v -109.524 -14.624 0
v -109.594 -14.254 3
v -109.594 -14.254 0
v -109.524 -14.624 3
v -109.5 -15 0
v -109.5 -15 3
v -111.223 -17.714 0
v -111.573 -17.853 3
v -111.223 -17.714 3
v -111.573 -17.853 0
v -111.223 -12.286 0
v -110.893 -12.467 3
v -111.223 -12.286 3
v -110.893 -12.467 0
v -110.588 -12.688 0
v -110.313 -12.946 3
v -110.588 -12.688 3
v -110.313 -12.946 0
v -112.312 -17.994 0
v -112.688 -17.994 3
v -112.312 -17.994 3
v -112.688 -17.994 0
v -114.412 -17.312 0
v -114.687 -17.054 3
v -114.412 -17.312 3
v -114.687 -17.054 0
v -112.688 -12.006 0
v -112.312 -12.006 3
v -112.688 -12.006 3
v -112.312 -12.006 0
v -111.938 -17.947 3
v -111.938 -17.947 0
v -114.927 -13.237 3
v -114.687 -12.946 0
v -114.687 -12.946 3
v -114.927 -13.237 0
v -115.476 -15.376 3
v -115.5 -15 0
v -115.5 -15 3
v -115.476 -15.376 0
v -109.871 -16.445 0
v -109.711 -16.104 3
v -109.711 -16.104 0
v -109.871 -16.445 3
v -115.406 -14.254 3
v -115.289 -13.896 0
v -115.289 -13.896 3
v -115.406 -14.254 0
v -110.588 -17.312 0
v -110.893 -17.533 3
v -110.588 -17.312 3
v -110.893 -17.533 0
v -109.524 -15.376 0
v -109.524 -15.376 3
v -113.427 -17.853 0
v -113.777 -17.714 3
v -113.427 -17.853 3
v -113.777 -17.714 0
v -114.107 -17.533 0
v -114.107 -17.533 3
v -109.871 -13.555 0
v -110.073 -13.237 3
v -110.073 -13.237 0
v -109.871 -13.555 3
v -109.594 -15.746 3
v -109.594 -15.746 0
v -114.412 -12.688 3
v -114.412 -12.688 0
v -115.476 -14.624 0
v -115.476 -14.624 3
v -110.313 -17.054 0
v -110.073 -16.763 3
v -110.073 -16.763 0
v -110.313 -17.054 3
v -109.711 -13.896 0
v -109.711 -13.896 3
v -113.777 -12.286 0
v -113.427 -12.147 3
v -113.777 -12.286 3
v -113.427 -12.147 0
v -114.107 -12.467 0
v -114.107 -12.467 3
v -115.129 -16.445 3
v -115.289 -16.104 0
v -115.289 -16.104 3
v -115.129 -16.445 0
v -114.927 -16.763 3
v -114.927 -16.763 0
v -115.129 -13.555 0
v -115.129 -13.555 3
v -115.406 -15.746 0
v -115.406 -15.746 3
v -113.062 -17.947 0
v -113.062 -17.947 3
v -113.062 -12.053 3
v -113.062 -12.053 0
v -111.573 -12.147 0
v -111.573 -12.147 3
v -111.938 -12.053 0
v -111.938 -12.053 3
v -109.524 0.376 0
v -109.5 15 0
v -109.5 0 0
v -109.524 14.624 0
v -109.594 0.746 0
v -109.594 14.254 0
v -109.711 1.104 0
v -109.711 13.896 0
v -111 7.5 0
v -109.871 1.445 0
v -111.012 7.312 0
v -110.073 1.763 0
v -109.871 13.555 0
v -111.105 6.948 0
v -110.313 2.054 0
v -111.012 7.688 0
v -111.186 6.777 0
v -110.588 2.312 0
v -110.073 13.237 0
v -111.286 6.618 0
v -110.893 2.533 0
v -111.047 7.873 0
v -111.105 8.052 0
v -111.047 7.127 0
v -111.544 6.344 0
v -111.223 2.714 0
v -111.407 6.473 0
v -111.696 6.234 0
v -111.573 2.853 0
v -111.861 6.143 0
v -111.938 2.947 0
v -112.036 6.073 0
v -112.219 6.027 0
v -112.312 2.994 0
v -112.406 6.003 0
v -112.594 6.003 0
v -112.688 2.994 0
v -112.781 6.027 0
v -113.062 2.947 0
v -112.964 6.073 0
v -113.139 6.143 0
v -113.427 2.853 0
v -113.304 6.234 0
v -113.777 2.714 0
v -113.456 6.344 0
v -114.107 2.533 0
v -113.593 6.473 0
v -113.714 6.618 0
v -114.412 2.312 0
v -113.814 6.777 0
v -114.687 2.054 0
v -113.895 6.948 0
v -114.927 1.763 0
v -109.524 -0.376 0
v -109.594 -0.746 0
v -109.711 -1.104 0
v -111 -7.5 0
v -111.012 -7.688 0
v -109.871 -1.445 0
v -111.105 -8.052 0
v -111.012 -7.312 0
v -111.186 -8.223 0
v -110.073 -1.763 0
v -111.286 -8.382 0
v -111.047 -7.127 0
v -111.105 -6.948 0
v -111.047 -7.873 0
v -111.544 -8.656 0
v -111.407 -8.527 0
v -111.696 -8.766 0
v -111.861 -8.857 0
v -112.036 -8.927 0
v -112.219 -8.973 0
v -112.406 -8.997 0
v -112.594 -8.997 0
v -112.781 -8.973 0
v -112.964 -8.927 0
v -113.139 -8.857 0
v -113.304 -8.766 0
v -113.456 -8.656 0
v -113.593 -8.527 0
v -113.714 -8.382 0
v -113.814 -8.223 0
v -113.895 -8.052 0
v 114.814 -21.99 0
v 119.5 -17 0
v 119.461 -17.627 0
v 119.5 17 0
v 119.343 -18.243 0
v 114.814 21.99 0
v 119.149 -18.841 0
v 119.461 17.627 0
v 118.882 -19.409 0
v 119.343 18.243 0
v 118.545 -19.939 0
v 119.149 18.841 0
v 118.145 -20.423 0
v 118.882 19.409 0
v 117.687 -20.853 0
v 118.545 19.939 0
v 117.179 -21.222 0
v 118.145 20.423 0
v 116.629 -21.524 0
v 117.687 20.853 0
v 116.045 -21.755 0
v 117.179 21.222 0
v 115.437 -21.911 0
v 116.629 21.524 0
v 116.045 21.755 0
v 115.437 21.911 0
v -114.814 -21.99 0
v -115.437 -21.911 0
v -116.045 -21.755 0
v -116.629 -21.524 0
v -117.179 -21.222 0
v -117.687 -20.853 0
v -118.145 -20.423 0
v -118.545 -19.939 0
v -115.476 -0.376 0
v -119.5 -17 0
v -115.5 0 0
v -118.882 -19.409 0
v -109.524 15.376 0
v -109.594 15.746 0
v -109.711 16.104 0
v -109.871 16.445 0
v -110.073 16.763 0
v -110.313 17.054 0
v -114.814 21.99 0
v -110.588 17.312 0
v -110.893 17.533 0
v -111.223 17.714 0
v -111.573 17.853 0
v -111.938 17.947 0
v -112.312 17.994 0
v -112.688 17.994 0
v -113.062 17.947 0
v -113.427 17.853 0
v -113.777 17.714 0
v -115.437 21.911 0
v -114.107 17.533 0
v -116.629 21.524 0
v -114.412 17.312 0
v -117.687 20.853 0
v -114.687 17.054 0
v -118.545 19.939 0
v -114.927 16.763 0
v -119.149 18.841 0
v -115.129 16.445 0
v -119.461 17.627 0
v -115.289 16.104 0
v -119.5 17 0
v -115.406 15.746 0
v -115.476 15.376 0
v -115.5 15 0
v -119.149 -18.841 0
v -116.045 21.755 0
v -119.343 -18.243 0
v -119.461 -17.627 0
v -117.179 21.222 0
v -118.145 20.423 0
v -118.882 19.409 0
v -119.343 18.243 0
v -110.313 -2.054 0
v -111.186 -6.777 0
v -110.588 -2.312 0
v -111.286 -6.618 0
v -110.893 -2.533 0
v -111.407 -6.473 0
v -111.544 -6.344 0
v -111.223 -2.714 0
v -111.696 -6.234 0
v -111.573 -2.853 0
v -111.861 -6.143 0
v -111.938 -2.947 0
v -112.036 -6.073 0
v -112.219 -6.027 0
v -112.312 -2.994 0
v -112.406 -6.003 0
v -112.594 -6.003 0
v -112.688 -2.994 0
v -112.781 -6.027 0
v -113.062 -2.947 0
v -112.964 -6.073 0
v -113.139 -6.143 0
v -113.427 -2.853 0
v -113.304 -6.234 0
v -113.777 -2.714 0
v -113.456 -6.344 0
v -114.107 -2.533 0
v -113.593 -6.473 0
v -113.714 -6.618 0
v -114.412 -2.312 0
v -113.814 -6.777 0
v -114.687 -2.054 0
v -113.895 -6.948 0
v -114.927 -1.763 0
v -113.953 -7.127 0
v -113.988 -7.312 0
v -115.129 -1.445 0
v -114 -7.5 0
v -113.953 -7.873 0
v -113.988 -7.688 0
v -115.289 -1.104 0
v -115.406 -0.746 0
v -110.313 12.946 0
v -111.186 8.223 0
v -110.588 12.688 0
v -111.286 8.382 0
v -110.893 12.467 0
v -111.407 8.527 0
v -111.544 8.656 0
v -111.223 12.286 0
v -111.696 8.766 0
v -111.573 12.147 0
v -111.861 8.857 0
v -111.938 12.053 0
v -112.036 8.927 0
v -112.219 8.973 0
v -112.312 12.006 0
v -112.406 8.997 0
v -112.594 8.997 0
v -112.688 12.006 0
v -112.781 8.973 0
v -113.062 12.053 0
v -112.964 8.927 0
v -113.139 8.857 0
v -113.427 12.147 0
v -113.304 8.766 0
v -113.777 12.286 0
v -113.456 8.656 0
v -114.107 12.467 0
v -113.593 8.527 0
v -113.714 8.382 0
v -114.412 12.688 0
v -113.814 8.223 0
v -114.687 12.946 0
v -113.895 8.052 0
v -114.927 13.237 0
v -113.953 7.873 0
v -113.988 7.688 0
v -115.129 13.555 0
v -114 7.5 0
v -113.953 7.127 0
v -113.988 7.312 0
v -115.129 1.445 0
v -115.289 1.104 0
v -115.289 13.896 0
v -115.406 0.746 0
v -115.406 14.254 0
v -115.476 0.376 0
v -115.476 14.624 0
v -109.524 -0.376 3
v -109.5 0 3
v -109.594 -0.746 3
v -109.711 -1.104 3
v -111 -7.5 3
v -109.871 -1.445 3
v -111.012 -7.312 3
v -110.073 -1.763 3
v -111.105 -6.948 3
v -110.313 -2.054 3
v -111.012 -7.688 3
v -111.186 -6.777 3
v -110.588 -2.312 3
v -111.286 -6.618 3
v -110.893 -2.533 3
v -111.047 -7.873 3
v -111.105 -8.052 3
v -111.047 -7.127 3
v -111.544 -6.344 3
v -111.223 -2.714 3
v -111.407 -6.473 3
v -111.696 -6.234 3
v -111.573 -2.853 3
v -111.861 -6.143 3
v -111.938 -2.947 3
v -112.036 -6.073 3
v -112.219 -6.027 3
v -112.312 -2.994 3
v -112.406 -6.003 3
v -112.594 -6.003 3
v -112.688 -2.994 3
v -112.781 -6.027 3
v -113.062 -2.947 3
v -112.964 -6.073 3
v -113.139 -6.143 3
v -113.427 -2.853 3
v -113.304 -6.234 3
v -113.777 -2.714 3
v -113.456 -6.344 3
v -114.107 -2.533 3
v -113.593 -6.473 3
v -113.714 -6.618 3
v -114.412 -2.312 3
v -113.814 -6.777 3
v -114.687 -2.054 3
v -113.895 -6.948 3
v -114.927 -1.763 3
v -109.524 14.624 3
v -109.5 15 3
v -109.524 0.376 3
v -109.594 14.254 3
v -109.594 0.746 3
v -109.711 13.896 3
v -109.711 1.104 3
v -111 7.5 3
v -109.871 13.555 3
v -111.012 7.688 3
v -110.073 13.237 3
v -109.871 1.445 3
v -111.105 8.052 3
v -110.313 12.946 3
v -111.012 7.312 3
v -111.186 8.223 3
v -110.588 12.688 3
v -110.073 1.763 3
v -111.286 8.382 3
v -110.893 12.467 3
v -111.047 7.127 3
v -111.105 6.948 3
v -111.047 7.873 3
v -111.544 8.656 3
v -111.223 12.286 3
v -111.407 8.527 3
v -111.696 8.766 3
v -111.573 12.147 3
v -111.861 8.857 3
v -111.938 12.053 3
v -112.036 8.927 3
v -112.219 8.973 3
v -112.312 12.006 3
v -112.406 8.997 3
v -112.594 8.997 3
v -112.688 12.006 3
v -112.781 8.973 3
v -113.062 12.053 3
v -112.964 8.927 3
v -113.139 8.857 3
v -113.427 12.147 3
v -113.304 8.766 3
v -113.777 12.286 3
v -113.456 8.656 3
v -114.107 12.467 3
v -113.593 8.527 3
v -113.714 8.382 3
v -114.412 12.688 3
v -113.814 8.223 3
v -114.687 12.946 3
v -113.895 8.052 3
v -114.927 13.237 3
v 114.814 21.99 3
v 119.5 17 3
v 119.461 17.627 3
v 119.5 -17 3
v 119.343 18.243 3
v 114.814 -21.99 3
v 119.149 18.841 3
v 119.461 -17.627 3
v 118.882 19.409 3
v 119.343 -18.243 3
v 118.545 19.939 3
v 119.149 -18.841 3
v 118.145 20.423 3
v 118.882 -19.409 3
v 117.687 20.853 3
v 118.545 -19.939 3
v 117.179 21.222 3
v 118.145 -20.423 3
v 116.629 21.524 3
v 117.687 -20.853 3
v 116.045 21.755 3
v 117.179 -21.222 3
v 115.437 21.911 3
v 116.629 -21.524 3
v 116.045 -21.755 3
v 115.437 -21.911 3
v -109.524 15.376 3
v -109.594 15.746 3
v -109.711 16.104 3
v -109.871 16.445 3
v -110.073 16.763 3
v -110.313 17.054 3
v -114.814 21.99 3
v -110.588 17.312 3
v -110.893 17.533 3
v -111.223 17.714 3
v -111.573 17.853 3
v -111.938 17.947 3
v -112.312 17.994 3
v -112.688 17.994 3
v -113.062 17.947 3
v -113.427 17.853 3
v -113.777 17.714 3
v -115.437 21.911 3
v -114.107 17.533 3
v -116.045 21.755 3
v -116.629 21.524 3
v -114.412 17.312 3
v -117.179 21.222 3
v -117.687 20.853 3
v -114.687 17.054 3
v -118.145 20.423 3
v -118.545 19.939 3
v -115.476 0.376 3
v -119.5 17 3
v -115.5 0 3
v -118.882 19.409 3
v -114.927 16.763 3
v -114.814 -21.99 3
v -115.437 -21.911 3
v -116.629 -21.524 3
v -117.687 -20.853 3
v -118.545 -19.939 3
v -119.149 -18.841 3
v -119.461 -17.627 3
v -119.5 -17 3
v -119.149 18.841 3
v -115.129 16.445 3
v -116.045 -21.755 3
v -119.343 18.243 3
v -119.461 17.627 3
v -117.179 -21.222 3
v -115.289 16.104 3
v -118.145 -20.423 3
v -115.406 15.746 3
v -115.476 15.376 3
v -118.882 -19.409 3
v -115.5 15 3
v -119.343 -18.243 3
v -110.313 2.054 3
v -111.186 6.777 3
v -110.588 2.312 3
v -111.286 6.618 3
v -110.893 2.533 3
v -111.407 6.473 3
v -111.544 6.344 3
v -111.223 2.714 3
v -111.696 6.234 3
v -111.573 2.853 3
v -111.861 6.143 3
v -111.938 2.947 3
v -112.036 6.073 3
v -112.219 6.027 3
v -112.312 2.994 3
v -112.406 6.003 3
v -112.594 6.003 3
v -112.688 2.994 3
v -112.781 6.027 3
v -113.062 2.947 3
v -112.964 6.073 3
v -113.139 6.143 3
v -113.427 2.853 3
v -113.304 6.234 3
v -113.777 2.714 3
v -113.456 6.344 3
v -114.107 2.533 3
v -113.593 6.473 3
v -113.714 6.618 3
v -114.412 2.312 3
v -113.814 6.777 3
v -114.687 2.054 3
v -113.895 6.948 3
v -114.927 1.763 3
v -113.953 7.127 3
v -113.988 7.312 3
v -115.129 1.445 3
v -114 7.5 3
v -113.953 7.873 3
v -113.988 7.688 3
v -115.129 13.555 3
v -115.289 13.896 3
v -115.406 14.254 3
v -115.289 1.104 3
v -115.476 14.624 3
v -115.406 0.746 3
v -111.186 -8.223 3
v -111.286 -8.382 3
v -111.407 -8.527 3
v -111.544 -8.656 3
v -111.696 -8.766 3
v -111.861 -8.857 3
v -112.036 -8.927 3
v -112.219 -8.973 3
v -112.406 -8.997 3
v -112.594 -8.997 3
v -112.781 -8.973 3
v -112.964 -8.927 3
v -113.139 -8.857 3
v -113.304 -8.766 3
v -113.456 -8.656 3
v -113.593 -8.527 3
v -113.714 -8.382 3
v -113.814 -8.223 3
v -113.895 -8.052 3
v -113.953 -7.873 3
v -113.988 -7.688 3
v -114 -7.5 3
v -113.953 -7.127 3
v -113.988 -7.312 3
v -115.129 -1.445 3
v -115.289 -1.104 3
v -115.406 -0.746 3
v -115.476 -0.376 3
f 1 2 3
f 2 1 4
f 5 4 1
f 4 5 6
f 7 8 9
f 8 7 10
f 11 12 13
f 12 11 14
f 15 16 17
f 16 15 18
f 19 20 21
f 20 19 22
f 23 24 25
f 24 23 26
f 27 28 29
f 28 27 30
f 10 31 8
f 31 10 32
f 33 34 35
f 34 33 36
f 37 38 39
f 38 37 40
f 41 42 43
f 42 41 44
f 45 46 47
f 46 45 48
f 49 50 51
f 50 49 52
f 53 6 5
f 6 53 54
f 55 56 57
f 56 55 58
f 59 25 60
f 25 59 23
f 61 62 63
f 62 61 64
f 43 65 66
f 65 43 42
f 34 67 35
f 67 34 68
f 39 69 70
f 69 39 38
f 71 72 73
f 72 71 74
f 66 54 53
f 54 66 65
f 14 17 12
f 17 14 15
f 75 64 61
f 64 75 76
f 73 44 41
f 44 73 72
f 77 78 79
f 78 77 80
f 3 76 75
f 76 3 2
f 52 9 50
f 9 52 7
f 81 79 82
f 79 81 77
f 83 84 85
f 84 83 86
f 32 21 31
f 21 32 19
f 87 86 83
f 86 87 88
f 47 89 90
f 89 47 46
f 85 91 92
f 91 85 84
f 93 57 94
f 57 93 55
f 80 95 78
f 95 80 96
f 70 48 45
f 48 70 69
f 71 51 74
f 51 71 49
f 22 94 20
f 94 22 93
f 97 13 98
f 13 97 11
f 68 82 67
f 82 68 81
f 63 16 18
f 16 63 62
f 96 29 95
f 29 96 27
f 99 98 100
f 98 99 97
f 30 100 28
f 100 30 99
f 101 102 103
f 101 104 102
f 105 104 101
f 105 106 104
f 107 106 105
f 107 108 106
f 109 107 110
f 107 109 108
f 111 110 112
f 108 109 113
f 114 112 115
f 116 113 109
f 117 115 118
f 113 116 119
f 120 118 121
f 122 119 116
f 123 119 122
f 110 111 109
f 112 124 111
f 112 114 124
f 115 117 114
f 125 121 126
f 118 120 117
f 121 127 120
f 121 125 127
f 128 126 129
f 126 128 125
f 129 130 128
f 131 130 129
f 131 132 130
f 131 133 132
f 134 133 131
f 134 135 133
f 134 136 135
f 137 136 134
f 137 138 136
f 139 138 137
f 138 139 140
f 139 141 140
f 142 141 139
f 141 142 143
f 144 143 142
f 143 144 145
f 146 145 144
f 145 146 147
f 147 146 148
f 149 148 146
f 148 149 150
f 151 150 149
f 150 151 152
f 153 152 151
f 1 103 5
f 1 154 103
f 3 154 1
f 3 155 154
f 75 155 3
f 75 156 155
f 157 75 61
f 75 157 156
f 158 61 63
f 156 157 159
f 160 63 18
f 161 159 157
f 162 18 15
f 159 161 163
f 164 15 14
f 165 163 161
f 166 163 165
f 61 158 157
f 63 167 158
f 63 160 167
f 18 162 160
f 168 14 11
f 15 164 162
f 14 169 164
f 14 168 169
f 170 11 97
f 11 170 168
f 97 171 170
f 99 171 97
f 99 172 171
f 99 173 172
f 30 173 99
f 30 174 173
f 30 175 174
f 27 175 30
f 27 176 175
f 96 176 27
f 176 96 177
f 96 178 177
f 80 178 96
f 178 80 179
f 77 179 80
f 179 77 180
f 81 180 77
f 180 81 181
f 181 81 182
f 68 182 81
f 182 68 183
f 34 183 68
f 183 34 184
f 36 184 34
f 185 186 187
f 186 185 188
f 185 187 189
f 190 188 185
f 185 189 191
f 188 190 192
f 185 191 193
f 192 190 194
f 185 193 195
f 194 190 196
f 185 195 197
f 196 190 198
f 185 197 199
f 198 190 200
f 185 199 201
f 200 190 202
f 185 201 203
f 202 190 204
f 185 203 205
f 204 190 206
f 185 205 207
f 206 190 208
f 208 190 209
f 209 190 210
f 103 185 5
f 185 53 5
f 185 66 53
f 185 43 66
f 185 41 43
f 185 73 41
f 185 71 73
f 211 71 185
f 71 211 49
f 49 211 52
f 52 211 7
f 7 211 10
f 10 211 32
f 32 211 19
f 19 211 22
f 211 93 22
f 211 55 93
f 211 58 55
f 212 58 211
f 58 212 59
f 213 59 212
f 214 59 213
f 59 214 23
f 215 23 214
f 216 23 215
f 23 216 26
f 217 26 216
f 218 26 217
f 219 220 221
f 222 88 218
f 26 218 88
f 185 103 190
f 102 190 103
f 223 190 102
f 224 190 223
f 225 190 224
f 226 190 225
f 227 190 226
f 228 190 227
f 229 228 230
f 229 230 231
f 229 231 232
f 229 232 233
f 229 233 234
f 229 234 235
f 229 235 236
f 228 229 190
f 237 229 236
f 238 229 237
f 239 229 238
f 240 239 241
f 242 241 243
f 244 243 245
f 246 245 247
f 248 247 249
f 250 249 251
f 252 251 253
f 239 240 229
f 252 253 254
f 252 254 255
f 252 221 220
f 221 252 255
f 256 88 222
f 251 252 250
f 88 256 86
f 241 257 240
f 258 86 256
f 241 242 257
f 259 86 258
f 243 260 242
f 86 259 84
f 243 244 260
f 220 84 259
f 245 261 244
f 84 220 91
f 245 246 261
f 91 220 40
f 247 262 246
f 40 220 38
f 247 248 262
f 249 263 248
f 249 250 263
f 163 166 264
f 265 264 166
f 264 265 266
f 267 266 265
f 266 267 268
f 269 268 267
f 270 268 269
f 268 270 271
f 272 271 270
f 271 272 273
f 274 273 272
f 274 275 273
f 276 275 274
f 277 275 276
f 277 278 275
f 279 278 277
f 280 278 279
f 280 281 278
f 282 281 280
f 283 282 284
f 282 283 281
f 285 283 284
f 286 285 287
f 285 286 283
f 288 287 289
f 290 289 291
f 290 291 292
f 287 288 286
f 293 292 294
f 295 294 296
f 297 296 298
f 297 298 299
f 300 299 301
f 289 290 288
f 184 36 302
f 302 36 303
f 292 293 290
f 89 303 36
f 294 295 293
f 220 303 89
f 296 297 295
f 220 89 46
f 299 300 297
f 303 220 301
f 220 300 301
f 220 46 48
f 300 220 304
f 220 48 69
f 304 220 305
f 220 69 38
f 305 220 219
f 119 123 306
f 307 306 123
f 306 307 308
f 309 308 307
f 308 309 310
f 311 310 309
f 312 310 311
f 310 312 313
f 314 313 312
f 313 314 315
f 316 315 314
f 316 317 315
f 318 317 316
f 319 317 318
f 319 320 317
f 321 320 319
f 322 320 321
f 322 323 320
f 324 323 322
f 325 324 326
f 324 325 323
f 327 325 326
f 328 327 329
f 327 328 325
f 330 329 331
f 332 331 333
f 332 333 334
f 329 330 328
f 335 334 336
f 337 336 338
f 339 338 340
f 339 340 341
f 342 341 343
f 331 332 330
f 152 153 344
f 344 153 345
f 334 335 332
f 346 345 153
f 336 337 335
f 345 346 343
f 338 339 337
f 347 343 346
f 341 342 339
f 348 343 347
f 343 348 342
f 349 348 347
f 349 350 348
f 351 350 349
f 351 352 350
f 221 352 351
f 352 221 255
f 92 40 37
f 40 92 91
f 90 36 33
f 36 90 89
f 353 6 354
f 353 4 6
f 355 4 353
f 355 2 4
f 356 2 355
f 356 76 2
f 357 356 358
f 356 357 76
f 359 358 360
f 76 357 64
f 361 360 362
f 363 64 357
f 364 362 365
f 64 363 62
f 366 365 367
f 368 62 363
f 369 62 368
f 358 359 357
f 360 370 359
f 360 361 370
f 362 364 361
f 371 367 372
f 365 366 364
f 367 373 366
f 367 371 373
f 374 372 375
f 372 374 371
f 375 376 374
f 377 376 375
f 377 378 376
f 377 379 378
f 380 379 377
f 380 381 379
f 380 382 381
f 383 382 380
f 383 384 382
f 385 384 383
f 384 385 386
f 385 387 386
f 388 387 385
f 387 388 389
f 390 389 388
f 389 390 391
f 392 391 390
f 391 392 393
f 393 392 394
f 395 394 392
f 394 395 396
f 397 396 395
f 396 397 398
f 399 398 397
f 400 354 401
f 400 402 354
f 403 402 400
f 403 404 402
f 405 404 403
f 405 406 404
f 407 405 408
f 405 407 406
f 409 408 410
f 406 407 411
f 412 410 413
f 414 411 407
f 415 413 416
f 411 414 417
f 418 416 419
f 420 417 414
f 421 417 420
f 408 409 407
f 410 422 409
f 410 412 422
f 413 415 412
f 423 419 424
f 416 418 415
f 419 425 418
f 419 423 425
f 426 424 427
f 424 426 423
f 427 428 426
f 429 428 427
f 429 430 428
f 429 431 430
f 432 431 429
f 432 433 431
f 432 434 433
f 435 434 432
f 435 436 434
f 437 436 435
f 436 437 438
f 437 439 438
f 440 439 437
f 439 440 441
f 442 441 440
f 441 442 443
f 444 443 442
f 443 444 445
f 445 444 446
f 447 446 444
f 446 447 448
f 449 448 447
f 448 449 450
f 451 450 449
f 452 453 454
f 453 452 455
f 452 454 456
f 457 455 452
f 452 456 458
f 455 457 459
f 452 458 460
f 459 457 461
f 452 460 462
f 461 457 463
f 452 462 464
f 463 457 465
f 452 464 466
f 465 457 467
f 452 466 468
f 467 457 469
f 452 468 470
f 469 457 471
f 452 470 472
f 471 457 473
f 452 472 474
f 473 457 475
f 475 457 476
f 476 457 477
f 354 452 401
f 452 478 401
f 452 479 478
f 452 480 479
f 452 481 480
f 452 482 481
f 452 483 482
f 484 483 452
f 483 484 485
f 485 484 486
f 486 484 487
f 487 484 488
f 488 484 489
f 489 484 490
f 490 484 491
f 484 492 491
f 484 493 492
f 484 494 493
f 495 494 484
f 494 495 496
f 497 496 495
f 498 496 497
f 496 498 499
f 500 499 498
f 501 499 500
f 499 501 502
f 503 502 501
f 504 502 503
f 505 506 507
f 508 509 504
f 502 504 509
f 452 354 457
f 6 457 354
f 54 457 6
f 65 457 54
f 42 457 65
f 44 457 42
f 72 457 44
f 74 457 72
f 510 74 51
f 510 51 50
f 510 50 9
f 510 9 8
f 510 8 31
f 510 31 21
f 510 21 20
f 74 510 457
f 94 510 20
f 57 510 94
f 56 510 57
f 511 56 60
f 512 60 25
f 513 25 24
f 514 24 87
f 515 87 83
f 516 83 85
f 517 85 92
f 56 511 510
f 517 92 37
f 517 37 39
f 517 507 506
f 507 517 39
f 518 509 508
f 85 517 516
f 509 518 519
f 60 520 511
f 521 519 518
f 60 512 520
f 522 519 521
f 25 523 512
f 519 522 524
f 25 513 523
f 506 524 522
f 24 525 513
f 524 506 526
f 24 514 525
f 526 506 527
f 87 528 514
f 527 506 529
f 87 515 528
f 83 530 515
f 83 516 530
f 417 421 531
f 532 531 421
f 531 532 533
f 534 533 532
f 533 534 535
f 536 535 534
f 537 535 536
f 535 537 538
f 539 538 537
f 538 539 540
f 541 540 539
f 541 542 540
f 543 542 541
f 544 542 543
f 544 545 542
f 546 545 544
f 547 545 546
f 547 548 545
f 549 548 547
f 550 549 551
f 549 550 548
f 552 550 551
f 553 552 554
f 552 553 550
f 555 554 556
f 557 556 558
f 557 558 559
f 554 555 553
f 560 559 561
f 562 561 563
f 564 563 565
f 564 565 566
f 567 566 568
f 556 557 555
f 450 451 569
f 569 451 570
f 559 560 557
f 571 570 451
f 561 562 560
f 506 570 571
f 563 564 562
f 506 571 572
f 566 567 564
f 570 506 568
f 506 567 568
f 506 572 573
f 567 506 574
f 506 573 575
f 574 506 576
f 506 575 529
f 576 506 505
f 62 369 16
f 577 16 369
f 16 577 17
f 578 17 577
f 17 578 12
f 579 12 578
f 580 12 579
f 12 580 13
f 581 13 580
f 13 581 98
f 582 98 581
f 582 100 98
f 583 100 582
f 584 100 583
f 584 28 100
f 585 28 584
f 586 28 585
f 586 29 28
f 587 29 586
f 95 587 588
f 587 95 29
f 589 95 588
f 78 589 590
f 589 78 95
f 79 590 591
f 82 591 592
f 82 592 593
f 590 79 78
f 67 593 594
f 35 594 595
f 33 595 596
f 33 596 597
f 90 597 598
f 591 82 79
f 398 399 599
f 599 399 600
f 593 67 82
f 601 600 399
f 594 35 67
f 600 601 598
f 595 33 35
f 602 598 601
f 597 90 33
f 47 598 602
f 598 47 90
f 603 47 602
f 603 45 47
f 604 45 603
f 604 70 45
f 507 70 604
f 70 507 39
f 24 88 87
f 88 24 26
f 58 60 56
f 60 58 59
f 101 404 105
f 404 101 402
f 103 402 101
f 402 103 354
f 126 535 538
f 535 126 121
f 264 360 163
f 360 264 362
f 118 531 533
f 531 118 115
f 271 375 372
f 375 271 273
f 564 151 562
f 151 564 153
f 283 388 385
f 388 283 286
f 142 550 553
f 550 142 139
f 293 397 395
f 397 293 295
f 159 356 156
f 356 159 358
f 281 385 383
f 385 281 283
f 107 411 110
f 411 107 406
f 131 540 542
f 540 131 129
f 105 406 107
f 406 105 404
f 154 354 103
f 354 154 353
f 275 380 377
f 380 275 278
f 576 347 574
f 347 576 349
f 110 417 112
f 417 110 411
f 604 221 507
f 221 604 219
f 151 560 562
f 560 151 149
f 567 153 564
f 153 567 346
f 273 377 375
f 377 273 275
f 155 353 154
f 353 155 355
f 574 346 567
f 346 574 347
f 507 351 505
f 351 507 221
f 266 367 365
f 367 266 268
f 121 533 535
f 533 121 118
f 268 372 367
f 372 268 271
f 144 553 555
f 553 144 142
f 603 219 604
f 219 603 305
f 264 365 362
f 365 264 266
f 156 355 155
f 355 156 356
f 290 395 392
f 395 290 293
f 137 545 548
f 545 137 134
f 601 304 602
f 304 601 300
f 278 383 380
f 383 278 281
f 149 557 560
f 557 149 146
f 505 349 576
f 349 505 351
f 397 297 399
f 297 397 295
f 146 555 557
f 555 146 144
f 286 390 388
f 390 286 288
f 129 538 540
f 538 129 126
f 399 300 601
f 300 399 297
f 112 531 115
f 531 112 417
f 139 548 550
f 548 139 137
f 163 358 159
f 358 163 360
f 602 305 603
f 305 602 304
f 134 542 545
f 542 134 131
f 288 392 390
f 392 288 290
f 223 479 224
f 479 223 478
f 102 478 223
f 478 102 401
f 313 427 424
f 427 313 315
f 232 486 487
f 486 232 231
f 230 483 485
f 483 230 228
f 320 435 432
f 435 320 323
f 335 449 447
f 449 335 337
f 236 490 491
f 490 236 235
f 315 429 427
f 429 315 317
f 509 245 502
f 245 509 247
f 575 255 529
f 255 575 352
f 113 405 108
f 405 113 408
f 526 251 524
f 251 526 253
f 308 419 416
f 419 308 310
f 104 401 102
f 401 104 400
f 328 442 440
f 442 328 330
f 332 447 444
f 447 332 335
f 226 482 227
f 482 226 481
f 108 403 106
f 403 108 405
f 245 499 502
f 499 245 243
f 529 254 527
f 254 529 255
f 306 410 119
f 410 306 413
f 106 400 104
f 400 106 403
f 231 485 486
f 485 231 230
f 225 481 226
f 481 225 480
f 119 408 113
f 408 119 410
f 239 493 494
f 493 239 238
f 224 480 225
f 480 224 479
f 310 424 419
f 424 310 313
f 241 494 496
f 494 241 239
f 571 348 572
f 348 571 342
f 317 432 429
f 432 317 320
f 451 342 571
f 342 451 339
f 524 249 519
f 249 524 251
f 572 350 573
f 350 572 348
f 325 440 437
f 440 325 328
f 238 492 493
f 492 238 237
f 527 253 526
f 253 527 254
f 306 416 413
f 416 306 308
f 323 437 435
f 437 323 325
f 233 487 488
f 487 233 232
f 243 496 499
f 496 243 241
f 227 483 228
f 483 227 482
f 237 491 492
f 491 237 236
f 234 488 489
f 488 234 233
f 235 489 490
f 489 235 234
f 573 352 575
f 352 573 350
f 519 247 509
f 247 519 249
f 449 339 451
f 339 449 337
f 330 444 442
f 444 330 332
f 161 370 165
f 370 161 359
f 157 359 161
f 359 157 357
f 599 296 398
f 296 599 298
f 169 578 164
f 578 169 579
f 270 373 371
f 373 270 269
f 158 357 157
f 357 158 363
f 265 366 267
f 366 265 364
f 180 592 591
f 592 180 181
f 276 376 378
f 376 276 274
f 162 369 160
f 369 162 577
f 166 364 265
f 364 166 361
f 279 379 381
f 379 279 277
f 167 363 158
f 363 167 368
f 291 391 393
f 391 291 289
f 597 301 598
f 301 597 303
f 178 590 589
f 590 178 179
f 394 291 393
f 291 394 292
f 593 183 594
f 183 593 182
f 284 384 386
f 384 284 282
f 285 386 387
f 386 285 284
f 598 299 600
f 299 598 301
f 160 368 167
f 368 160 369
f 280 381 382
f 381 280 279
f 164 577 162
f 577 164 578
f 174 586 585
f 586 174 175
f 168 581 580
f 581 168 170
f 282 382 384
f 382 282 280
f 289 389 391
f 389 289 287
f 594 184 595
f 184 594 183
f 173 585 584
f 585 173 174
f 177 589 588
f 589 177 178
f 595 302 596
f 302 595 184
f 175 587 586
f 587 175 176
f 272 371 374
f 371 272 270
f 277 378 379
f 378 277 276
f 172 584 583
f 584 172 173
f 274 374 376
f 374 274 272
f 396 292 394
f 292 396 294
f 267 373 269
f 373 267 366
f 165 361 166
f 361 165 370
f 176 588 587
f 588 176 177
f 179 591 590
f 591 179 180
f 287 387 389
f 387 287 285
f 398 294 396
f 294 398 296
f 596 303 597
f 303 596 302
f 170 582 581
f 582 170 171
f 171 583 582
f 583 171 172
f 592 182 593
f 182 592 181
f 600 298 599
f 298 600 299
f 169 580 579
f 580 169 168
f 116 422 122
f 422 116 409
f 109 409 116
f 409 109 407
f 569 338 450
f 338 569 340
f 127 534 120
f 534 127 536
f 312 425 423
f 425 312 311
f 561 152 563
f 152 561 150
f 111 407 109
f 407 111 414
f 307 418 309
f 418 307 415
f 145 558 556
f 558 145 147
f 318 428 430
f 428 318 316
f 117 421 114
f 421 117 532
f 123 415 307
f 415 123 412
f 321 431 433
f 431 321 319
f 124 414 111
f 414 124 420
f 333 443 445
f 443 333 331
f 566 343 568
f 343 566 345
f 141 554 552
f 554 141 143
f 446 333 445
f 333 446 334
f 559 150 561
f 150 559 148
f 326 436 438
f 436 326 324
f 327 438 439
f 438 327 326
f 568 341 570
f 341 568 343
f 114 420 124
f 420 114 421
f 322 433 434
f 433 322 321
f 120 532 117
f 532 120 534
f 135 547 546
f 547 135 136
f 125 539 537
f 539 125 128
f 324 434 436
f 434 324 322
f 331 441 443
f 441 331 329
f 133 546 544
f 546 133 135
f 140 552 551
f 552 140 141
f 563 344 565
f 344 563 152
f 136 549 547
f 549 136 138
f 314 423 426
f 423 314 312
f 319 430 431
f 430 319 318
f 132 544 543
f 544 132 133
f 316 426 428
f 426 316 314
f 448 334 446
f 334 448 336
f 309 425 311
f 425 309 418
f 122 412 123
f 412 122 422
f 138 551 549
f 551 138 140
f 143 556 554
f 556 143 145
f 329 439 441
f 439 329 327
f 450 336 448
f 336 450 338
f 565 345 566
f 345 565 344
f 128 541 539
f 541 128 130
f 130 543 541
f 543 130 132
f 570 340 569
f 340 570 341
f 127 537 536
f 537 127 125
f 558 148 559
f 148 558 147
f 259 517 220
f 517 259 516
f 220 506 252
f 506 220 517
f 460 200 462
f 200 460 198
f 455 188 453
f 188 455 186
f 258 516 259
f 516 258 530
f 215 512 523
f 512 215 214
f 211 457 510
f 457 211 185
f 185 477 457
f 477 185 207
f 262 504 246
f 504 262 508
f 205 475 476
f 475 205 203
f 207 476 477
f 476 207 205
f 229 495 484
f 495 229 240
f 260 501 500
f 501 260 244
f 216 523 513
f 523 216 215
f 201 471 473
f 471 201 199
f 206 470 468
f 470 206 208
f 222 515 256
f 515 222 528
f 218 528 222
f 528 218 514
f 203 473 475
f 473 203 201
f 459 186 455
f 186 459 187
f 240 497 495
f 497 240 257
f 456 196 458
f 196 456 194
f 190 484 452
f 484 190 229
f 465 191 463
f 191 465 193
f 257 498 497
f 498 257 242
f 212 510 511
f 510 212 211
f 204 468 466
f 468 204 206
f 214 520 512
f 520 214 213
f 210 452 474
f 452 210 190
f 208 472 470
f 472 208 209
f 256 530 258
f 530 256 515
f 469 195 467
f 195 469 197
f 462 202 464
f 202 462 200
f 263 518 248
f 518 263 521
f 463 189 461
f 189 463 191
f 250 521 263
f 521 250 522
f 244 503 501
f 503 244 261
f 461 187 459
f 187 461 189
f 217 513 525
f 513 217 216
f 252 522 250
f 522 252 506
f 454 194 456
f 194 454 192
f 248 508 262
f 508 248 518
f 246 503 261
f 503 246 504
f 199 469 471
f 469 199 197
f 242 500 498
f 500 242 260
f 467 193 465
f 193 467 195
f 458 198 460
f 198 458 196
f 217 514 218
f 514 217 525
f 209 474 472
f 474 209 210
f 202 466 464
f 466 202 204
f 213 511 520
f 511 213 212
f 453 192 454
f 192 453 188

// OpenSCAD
$fn = 50;


difference() {
	union() {
		hull() {
			translate(v = [-114.5000000000, 17.0000000000, 0]) {
				cylinder(h = 3, r = 5);
			}
			translate(v = [114.5000000000, 17.0000000000, 0]) {
				cylinder(h = 3, r = 5);
			}
			translate(v = [-114.5000000000, -17.0000000000, 0]) {
				cylinder(h = 3, r = 5);
			}
			translate(v = [114.5000000000, -17.0000000000, 0]) {
				cylinder(h = 3, r = 5);
			}
		}
	}
	union() {
		translate(v = [-112.5000000000, -15.0000000000, 0]) {
			cylinder(h = 3, r = 3.0000000000);
		}
		translate(v = [-112.5000000000, 0.0000000000, 0]) {
			cylinder(h = 3, r = 3.0000000000);
		}
		translate(v = [-112.5000000000, 15.0000000000, 0]) {
			cylinder(h = 3, r = 3.0000000000);
		}
		translate(v = [-112.5000000000, -15.0000000000, 0]) {
			cylinder(h = 3, r = 1.5000000000);
		}
		translate(v = [-112.5000000000, -7.5000000000, 0]) {
			cylinder(h = 3, r = 1.5000000000);
		}
		translate(v = [-112.5000000000, 0.0000000000, 0]) {
			cylinder(h = 3, r = 1.5000000000);
		}
		translate(v = [-112.5000000000, 7.5000000000, 0]) {
			cylinder(h = 3, r = 1.5000000000);
		}
		translate(v = [-112.5000000000, 15.0000000000, 0]) {
			cylinder(h = 3, r = 1.5000000000);
		}
		translate(v = [-112.5000000000, -15.0000000000, 0]) {
			cylinder(h = 3, r = 1.5000000000);
		}
		translate(v = [-112.5000000000, -7.5000000000, 0]) {
			cylinder(h = 3, r = 1.5000000000);
		}
		translate(v = [-112.5000000000, 0.0000000000, 0]) {
			cylinder(h = 3, r = 1.5000000000);
		}
		translate(v = [-112.5000000000, 7.5000000000, 0]) {
			cylinder(h = 3, r = 1.5000000000);
		}
		translate(v = [-112.5000000000, 15.0000000000, 0]) {
			cylinder(h = 3, r = 1.5000000000);
		}
		translate(v = [-112.5000000000, -15.0000000000, 0]) {
			cylinder(h = 3, r = 1.5000000000);
		}
		translate(v = [-112.5000000000, -7.5000000000, 0]) {
			cylinder(h = 3, r = 1.5000000000);
		}
		translate(v = [-112.5000000000, 0.0000000000, 0]) {
			cylinder(h = 3, r = 1.5000000000);
		}
		translate(v = [-112.5000000000, 7.5000000000, 0]) {
			cylinder(h = 3, r = 1.5000000000);
		}
		translate(v = [-112.5000000000, 15.0000000000, 0]) {
			cylinder(h = 3, r = 1.5000000000);
		}
	}
}
